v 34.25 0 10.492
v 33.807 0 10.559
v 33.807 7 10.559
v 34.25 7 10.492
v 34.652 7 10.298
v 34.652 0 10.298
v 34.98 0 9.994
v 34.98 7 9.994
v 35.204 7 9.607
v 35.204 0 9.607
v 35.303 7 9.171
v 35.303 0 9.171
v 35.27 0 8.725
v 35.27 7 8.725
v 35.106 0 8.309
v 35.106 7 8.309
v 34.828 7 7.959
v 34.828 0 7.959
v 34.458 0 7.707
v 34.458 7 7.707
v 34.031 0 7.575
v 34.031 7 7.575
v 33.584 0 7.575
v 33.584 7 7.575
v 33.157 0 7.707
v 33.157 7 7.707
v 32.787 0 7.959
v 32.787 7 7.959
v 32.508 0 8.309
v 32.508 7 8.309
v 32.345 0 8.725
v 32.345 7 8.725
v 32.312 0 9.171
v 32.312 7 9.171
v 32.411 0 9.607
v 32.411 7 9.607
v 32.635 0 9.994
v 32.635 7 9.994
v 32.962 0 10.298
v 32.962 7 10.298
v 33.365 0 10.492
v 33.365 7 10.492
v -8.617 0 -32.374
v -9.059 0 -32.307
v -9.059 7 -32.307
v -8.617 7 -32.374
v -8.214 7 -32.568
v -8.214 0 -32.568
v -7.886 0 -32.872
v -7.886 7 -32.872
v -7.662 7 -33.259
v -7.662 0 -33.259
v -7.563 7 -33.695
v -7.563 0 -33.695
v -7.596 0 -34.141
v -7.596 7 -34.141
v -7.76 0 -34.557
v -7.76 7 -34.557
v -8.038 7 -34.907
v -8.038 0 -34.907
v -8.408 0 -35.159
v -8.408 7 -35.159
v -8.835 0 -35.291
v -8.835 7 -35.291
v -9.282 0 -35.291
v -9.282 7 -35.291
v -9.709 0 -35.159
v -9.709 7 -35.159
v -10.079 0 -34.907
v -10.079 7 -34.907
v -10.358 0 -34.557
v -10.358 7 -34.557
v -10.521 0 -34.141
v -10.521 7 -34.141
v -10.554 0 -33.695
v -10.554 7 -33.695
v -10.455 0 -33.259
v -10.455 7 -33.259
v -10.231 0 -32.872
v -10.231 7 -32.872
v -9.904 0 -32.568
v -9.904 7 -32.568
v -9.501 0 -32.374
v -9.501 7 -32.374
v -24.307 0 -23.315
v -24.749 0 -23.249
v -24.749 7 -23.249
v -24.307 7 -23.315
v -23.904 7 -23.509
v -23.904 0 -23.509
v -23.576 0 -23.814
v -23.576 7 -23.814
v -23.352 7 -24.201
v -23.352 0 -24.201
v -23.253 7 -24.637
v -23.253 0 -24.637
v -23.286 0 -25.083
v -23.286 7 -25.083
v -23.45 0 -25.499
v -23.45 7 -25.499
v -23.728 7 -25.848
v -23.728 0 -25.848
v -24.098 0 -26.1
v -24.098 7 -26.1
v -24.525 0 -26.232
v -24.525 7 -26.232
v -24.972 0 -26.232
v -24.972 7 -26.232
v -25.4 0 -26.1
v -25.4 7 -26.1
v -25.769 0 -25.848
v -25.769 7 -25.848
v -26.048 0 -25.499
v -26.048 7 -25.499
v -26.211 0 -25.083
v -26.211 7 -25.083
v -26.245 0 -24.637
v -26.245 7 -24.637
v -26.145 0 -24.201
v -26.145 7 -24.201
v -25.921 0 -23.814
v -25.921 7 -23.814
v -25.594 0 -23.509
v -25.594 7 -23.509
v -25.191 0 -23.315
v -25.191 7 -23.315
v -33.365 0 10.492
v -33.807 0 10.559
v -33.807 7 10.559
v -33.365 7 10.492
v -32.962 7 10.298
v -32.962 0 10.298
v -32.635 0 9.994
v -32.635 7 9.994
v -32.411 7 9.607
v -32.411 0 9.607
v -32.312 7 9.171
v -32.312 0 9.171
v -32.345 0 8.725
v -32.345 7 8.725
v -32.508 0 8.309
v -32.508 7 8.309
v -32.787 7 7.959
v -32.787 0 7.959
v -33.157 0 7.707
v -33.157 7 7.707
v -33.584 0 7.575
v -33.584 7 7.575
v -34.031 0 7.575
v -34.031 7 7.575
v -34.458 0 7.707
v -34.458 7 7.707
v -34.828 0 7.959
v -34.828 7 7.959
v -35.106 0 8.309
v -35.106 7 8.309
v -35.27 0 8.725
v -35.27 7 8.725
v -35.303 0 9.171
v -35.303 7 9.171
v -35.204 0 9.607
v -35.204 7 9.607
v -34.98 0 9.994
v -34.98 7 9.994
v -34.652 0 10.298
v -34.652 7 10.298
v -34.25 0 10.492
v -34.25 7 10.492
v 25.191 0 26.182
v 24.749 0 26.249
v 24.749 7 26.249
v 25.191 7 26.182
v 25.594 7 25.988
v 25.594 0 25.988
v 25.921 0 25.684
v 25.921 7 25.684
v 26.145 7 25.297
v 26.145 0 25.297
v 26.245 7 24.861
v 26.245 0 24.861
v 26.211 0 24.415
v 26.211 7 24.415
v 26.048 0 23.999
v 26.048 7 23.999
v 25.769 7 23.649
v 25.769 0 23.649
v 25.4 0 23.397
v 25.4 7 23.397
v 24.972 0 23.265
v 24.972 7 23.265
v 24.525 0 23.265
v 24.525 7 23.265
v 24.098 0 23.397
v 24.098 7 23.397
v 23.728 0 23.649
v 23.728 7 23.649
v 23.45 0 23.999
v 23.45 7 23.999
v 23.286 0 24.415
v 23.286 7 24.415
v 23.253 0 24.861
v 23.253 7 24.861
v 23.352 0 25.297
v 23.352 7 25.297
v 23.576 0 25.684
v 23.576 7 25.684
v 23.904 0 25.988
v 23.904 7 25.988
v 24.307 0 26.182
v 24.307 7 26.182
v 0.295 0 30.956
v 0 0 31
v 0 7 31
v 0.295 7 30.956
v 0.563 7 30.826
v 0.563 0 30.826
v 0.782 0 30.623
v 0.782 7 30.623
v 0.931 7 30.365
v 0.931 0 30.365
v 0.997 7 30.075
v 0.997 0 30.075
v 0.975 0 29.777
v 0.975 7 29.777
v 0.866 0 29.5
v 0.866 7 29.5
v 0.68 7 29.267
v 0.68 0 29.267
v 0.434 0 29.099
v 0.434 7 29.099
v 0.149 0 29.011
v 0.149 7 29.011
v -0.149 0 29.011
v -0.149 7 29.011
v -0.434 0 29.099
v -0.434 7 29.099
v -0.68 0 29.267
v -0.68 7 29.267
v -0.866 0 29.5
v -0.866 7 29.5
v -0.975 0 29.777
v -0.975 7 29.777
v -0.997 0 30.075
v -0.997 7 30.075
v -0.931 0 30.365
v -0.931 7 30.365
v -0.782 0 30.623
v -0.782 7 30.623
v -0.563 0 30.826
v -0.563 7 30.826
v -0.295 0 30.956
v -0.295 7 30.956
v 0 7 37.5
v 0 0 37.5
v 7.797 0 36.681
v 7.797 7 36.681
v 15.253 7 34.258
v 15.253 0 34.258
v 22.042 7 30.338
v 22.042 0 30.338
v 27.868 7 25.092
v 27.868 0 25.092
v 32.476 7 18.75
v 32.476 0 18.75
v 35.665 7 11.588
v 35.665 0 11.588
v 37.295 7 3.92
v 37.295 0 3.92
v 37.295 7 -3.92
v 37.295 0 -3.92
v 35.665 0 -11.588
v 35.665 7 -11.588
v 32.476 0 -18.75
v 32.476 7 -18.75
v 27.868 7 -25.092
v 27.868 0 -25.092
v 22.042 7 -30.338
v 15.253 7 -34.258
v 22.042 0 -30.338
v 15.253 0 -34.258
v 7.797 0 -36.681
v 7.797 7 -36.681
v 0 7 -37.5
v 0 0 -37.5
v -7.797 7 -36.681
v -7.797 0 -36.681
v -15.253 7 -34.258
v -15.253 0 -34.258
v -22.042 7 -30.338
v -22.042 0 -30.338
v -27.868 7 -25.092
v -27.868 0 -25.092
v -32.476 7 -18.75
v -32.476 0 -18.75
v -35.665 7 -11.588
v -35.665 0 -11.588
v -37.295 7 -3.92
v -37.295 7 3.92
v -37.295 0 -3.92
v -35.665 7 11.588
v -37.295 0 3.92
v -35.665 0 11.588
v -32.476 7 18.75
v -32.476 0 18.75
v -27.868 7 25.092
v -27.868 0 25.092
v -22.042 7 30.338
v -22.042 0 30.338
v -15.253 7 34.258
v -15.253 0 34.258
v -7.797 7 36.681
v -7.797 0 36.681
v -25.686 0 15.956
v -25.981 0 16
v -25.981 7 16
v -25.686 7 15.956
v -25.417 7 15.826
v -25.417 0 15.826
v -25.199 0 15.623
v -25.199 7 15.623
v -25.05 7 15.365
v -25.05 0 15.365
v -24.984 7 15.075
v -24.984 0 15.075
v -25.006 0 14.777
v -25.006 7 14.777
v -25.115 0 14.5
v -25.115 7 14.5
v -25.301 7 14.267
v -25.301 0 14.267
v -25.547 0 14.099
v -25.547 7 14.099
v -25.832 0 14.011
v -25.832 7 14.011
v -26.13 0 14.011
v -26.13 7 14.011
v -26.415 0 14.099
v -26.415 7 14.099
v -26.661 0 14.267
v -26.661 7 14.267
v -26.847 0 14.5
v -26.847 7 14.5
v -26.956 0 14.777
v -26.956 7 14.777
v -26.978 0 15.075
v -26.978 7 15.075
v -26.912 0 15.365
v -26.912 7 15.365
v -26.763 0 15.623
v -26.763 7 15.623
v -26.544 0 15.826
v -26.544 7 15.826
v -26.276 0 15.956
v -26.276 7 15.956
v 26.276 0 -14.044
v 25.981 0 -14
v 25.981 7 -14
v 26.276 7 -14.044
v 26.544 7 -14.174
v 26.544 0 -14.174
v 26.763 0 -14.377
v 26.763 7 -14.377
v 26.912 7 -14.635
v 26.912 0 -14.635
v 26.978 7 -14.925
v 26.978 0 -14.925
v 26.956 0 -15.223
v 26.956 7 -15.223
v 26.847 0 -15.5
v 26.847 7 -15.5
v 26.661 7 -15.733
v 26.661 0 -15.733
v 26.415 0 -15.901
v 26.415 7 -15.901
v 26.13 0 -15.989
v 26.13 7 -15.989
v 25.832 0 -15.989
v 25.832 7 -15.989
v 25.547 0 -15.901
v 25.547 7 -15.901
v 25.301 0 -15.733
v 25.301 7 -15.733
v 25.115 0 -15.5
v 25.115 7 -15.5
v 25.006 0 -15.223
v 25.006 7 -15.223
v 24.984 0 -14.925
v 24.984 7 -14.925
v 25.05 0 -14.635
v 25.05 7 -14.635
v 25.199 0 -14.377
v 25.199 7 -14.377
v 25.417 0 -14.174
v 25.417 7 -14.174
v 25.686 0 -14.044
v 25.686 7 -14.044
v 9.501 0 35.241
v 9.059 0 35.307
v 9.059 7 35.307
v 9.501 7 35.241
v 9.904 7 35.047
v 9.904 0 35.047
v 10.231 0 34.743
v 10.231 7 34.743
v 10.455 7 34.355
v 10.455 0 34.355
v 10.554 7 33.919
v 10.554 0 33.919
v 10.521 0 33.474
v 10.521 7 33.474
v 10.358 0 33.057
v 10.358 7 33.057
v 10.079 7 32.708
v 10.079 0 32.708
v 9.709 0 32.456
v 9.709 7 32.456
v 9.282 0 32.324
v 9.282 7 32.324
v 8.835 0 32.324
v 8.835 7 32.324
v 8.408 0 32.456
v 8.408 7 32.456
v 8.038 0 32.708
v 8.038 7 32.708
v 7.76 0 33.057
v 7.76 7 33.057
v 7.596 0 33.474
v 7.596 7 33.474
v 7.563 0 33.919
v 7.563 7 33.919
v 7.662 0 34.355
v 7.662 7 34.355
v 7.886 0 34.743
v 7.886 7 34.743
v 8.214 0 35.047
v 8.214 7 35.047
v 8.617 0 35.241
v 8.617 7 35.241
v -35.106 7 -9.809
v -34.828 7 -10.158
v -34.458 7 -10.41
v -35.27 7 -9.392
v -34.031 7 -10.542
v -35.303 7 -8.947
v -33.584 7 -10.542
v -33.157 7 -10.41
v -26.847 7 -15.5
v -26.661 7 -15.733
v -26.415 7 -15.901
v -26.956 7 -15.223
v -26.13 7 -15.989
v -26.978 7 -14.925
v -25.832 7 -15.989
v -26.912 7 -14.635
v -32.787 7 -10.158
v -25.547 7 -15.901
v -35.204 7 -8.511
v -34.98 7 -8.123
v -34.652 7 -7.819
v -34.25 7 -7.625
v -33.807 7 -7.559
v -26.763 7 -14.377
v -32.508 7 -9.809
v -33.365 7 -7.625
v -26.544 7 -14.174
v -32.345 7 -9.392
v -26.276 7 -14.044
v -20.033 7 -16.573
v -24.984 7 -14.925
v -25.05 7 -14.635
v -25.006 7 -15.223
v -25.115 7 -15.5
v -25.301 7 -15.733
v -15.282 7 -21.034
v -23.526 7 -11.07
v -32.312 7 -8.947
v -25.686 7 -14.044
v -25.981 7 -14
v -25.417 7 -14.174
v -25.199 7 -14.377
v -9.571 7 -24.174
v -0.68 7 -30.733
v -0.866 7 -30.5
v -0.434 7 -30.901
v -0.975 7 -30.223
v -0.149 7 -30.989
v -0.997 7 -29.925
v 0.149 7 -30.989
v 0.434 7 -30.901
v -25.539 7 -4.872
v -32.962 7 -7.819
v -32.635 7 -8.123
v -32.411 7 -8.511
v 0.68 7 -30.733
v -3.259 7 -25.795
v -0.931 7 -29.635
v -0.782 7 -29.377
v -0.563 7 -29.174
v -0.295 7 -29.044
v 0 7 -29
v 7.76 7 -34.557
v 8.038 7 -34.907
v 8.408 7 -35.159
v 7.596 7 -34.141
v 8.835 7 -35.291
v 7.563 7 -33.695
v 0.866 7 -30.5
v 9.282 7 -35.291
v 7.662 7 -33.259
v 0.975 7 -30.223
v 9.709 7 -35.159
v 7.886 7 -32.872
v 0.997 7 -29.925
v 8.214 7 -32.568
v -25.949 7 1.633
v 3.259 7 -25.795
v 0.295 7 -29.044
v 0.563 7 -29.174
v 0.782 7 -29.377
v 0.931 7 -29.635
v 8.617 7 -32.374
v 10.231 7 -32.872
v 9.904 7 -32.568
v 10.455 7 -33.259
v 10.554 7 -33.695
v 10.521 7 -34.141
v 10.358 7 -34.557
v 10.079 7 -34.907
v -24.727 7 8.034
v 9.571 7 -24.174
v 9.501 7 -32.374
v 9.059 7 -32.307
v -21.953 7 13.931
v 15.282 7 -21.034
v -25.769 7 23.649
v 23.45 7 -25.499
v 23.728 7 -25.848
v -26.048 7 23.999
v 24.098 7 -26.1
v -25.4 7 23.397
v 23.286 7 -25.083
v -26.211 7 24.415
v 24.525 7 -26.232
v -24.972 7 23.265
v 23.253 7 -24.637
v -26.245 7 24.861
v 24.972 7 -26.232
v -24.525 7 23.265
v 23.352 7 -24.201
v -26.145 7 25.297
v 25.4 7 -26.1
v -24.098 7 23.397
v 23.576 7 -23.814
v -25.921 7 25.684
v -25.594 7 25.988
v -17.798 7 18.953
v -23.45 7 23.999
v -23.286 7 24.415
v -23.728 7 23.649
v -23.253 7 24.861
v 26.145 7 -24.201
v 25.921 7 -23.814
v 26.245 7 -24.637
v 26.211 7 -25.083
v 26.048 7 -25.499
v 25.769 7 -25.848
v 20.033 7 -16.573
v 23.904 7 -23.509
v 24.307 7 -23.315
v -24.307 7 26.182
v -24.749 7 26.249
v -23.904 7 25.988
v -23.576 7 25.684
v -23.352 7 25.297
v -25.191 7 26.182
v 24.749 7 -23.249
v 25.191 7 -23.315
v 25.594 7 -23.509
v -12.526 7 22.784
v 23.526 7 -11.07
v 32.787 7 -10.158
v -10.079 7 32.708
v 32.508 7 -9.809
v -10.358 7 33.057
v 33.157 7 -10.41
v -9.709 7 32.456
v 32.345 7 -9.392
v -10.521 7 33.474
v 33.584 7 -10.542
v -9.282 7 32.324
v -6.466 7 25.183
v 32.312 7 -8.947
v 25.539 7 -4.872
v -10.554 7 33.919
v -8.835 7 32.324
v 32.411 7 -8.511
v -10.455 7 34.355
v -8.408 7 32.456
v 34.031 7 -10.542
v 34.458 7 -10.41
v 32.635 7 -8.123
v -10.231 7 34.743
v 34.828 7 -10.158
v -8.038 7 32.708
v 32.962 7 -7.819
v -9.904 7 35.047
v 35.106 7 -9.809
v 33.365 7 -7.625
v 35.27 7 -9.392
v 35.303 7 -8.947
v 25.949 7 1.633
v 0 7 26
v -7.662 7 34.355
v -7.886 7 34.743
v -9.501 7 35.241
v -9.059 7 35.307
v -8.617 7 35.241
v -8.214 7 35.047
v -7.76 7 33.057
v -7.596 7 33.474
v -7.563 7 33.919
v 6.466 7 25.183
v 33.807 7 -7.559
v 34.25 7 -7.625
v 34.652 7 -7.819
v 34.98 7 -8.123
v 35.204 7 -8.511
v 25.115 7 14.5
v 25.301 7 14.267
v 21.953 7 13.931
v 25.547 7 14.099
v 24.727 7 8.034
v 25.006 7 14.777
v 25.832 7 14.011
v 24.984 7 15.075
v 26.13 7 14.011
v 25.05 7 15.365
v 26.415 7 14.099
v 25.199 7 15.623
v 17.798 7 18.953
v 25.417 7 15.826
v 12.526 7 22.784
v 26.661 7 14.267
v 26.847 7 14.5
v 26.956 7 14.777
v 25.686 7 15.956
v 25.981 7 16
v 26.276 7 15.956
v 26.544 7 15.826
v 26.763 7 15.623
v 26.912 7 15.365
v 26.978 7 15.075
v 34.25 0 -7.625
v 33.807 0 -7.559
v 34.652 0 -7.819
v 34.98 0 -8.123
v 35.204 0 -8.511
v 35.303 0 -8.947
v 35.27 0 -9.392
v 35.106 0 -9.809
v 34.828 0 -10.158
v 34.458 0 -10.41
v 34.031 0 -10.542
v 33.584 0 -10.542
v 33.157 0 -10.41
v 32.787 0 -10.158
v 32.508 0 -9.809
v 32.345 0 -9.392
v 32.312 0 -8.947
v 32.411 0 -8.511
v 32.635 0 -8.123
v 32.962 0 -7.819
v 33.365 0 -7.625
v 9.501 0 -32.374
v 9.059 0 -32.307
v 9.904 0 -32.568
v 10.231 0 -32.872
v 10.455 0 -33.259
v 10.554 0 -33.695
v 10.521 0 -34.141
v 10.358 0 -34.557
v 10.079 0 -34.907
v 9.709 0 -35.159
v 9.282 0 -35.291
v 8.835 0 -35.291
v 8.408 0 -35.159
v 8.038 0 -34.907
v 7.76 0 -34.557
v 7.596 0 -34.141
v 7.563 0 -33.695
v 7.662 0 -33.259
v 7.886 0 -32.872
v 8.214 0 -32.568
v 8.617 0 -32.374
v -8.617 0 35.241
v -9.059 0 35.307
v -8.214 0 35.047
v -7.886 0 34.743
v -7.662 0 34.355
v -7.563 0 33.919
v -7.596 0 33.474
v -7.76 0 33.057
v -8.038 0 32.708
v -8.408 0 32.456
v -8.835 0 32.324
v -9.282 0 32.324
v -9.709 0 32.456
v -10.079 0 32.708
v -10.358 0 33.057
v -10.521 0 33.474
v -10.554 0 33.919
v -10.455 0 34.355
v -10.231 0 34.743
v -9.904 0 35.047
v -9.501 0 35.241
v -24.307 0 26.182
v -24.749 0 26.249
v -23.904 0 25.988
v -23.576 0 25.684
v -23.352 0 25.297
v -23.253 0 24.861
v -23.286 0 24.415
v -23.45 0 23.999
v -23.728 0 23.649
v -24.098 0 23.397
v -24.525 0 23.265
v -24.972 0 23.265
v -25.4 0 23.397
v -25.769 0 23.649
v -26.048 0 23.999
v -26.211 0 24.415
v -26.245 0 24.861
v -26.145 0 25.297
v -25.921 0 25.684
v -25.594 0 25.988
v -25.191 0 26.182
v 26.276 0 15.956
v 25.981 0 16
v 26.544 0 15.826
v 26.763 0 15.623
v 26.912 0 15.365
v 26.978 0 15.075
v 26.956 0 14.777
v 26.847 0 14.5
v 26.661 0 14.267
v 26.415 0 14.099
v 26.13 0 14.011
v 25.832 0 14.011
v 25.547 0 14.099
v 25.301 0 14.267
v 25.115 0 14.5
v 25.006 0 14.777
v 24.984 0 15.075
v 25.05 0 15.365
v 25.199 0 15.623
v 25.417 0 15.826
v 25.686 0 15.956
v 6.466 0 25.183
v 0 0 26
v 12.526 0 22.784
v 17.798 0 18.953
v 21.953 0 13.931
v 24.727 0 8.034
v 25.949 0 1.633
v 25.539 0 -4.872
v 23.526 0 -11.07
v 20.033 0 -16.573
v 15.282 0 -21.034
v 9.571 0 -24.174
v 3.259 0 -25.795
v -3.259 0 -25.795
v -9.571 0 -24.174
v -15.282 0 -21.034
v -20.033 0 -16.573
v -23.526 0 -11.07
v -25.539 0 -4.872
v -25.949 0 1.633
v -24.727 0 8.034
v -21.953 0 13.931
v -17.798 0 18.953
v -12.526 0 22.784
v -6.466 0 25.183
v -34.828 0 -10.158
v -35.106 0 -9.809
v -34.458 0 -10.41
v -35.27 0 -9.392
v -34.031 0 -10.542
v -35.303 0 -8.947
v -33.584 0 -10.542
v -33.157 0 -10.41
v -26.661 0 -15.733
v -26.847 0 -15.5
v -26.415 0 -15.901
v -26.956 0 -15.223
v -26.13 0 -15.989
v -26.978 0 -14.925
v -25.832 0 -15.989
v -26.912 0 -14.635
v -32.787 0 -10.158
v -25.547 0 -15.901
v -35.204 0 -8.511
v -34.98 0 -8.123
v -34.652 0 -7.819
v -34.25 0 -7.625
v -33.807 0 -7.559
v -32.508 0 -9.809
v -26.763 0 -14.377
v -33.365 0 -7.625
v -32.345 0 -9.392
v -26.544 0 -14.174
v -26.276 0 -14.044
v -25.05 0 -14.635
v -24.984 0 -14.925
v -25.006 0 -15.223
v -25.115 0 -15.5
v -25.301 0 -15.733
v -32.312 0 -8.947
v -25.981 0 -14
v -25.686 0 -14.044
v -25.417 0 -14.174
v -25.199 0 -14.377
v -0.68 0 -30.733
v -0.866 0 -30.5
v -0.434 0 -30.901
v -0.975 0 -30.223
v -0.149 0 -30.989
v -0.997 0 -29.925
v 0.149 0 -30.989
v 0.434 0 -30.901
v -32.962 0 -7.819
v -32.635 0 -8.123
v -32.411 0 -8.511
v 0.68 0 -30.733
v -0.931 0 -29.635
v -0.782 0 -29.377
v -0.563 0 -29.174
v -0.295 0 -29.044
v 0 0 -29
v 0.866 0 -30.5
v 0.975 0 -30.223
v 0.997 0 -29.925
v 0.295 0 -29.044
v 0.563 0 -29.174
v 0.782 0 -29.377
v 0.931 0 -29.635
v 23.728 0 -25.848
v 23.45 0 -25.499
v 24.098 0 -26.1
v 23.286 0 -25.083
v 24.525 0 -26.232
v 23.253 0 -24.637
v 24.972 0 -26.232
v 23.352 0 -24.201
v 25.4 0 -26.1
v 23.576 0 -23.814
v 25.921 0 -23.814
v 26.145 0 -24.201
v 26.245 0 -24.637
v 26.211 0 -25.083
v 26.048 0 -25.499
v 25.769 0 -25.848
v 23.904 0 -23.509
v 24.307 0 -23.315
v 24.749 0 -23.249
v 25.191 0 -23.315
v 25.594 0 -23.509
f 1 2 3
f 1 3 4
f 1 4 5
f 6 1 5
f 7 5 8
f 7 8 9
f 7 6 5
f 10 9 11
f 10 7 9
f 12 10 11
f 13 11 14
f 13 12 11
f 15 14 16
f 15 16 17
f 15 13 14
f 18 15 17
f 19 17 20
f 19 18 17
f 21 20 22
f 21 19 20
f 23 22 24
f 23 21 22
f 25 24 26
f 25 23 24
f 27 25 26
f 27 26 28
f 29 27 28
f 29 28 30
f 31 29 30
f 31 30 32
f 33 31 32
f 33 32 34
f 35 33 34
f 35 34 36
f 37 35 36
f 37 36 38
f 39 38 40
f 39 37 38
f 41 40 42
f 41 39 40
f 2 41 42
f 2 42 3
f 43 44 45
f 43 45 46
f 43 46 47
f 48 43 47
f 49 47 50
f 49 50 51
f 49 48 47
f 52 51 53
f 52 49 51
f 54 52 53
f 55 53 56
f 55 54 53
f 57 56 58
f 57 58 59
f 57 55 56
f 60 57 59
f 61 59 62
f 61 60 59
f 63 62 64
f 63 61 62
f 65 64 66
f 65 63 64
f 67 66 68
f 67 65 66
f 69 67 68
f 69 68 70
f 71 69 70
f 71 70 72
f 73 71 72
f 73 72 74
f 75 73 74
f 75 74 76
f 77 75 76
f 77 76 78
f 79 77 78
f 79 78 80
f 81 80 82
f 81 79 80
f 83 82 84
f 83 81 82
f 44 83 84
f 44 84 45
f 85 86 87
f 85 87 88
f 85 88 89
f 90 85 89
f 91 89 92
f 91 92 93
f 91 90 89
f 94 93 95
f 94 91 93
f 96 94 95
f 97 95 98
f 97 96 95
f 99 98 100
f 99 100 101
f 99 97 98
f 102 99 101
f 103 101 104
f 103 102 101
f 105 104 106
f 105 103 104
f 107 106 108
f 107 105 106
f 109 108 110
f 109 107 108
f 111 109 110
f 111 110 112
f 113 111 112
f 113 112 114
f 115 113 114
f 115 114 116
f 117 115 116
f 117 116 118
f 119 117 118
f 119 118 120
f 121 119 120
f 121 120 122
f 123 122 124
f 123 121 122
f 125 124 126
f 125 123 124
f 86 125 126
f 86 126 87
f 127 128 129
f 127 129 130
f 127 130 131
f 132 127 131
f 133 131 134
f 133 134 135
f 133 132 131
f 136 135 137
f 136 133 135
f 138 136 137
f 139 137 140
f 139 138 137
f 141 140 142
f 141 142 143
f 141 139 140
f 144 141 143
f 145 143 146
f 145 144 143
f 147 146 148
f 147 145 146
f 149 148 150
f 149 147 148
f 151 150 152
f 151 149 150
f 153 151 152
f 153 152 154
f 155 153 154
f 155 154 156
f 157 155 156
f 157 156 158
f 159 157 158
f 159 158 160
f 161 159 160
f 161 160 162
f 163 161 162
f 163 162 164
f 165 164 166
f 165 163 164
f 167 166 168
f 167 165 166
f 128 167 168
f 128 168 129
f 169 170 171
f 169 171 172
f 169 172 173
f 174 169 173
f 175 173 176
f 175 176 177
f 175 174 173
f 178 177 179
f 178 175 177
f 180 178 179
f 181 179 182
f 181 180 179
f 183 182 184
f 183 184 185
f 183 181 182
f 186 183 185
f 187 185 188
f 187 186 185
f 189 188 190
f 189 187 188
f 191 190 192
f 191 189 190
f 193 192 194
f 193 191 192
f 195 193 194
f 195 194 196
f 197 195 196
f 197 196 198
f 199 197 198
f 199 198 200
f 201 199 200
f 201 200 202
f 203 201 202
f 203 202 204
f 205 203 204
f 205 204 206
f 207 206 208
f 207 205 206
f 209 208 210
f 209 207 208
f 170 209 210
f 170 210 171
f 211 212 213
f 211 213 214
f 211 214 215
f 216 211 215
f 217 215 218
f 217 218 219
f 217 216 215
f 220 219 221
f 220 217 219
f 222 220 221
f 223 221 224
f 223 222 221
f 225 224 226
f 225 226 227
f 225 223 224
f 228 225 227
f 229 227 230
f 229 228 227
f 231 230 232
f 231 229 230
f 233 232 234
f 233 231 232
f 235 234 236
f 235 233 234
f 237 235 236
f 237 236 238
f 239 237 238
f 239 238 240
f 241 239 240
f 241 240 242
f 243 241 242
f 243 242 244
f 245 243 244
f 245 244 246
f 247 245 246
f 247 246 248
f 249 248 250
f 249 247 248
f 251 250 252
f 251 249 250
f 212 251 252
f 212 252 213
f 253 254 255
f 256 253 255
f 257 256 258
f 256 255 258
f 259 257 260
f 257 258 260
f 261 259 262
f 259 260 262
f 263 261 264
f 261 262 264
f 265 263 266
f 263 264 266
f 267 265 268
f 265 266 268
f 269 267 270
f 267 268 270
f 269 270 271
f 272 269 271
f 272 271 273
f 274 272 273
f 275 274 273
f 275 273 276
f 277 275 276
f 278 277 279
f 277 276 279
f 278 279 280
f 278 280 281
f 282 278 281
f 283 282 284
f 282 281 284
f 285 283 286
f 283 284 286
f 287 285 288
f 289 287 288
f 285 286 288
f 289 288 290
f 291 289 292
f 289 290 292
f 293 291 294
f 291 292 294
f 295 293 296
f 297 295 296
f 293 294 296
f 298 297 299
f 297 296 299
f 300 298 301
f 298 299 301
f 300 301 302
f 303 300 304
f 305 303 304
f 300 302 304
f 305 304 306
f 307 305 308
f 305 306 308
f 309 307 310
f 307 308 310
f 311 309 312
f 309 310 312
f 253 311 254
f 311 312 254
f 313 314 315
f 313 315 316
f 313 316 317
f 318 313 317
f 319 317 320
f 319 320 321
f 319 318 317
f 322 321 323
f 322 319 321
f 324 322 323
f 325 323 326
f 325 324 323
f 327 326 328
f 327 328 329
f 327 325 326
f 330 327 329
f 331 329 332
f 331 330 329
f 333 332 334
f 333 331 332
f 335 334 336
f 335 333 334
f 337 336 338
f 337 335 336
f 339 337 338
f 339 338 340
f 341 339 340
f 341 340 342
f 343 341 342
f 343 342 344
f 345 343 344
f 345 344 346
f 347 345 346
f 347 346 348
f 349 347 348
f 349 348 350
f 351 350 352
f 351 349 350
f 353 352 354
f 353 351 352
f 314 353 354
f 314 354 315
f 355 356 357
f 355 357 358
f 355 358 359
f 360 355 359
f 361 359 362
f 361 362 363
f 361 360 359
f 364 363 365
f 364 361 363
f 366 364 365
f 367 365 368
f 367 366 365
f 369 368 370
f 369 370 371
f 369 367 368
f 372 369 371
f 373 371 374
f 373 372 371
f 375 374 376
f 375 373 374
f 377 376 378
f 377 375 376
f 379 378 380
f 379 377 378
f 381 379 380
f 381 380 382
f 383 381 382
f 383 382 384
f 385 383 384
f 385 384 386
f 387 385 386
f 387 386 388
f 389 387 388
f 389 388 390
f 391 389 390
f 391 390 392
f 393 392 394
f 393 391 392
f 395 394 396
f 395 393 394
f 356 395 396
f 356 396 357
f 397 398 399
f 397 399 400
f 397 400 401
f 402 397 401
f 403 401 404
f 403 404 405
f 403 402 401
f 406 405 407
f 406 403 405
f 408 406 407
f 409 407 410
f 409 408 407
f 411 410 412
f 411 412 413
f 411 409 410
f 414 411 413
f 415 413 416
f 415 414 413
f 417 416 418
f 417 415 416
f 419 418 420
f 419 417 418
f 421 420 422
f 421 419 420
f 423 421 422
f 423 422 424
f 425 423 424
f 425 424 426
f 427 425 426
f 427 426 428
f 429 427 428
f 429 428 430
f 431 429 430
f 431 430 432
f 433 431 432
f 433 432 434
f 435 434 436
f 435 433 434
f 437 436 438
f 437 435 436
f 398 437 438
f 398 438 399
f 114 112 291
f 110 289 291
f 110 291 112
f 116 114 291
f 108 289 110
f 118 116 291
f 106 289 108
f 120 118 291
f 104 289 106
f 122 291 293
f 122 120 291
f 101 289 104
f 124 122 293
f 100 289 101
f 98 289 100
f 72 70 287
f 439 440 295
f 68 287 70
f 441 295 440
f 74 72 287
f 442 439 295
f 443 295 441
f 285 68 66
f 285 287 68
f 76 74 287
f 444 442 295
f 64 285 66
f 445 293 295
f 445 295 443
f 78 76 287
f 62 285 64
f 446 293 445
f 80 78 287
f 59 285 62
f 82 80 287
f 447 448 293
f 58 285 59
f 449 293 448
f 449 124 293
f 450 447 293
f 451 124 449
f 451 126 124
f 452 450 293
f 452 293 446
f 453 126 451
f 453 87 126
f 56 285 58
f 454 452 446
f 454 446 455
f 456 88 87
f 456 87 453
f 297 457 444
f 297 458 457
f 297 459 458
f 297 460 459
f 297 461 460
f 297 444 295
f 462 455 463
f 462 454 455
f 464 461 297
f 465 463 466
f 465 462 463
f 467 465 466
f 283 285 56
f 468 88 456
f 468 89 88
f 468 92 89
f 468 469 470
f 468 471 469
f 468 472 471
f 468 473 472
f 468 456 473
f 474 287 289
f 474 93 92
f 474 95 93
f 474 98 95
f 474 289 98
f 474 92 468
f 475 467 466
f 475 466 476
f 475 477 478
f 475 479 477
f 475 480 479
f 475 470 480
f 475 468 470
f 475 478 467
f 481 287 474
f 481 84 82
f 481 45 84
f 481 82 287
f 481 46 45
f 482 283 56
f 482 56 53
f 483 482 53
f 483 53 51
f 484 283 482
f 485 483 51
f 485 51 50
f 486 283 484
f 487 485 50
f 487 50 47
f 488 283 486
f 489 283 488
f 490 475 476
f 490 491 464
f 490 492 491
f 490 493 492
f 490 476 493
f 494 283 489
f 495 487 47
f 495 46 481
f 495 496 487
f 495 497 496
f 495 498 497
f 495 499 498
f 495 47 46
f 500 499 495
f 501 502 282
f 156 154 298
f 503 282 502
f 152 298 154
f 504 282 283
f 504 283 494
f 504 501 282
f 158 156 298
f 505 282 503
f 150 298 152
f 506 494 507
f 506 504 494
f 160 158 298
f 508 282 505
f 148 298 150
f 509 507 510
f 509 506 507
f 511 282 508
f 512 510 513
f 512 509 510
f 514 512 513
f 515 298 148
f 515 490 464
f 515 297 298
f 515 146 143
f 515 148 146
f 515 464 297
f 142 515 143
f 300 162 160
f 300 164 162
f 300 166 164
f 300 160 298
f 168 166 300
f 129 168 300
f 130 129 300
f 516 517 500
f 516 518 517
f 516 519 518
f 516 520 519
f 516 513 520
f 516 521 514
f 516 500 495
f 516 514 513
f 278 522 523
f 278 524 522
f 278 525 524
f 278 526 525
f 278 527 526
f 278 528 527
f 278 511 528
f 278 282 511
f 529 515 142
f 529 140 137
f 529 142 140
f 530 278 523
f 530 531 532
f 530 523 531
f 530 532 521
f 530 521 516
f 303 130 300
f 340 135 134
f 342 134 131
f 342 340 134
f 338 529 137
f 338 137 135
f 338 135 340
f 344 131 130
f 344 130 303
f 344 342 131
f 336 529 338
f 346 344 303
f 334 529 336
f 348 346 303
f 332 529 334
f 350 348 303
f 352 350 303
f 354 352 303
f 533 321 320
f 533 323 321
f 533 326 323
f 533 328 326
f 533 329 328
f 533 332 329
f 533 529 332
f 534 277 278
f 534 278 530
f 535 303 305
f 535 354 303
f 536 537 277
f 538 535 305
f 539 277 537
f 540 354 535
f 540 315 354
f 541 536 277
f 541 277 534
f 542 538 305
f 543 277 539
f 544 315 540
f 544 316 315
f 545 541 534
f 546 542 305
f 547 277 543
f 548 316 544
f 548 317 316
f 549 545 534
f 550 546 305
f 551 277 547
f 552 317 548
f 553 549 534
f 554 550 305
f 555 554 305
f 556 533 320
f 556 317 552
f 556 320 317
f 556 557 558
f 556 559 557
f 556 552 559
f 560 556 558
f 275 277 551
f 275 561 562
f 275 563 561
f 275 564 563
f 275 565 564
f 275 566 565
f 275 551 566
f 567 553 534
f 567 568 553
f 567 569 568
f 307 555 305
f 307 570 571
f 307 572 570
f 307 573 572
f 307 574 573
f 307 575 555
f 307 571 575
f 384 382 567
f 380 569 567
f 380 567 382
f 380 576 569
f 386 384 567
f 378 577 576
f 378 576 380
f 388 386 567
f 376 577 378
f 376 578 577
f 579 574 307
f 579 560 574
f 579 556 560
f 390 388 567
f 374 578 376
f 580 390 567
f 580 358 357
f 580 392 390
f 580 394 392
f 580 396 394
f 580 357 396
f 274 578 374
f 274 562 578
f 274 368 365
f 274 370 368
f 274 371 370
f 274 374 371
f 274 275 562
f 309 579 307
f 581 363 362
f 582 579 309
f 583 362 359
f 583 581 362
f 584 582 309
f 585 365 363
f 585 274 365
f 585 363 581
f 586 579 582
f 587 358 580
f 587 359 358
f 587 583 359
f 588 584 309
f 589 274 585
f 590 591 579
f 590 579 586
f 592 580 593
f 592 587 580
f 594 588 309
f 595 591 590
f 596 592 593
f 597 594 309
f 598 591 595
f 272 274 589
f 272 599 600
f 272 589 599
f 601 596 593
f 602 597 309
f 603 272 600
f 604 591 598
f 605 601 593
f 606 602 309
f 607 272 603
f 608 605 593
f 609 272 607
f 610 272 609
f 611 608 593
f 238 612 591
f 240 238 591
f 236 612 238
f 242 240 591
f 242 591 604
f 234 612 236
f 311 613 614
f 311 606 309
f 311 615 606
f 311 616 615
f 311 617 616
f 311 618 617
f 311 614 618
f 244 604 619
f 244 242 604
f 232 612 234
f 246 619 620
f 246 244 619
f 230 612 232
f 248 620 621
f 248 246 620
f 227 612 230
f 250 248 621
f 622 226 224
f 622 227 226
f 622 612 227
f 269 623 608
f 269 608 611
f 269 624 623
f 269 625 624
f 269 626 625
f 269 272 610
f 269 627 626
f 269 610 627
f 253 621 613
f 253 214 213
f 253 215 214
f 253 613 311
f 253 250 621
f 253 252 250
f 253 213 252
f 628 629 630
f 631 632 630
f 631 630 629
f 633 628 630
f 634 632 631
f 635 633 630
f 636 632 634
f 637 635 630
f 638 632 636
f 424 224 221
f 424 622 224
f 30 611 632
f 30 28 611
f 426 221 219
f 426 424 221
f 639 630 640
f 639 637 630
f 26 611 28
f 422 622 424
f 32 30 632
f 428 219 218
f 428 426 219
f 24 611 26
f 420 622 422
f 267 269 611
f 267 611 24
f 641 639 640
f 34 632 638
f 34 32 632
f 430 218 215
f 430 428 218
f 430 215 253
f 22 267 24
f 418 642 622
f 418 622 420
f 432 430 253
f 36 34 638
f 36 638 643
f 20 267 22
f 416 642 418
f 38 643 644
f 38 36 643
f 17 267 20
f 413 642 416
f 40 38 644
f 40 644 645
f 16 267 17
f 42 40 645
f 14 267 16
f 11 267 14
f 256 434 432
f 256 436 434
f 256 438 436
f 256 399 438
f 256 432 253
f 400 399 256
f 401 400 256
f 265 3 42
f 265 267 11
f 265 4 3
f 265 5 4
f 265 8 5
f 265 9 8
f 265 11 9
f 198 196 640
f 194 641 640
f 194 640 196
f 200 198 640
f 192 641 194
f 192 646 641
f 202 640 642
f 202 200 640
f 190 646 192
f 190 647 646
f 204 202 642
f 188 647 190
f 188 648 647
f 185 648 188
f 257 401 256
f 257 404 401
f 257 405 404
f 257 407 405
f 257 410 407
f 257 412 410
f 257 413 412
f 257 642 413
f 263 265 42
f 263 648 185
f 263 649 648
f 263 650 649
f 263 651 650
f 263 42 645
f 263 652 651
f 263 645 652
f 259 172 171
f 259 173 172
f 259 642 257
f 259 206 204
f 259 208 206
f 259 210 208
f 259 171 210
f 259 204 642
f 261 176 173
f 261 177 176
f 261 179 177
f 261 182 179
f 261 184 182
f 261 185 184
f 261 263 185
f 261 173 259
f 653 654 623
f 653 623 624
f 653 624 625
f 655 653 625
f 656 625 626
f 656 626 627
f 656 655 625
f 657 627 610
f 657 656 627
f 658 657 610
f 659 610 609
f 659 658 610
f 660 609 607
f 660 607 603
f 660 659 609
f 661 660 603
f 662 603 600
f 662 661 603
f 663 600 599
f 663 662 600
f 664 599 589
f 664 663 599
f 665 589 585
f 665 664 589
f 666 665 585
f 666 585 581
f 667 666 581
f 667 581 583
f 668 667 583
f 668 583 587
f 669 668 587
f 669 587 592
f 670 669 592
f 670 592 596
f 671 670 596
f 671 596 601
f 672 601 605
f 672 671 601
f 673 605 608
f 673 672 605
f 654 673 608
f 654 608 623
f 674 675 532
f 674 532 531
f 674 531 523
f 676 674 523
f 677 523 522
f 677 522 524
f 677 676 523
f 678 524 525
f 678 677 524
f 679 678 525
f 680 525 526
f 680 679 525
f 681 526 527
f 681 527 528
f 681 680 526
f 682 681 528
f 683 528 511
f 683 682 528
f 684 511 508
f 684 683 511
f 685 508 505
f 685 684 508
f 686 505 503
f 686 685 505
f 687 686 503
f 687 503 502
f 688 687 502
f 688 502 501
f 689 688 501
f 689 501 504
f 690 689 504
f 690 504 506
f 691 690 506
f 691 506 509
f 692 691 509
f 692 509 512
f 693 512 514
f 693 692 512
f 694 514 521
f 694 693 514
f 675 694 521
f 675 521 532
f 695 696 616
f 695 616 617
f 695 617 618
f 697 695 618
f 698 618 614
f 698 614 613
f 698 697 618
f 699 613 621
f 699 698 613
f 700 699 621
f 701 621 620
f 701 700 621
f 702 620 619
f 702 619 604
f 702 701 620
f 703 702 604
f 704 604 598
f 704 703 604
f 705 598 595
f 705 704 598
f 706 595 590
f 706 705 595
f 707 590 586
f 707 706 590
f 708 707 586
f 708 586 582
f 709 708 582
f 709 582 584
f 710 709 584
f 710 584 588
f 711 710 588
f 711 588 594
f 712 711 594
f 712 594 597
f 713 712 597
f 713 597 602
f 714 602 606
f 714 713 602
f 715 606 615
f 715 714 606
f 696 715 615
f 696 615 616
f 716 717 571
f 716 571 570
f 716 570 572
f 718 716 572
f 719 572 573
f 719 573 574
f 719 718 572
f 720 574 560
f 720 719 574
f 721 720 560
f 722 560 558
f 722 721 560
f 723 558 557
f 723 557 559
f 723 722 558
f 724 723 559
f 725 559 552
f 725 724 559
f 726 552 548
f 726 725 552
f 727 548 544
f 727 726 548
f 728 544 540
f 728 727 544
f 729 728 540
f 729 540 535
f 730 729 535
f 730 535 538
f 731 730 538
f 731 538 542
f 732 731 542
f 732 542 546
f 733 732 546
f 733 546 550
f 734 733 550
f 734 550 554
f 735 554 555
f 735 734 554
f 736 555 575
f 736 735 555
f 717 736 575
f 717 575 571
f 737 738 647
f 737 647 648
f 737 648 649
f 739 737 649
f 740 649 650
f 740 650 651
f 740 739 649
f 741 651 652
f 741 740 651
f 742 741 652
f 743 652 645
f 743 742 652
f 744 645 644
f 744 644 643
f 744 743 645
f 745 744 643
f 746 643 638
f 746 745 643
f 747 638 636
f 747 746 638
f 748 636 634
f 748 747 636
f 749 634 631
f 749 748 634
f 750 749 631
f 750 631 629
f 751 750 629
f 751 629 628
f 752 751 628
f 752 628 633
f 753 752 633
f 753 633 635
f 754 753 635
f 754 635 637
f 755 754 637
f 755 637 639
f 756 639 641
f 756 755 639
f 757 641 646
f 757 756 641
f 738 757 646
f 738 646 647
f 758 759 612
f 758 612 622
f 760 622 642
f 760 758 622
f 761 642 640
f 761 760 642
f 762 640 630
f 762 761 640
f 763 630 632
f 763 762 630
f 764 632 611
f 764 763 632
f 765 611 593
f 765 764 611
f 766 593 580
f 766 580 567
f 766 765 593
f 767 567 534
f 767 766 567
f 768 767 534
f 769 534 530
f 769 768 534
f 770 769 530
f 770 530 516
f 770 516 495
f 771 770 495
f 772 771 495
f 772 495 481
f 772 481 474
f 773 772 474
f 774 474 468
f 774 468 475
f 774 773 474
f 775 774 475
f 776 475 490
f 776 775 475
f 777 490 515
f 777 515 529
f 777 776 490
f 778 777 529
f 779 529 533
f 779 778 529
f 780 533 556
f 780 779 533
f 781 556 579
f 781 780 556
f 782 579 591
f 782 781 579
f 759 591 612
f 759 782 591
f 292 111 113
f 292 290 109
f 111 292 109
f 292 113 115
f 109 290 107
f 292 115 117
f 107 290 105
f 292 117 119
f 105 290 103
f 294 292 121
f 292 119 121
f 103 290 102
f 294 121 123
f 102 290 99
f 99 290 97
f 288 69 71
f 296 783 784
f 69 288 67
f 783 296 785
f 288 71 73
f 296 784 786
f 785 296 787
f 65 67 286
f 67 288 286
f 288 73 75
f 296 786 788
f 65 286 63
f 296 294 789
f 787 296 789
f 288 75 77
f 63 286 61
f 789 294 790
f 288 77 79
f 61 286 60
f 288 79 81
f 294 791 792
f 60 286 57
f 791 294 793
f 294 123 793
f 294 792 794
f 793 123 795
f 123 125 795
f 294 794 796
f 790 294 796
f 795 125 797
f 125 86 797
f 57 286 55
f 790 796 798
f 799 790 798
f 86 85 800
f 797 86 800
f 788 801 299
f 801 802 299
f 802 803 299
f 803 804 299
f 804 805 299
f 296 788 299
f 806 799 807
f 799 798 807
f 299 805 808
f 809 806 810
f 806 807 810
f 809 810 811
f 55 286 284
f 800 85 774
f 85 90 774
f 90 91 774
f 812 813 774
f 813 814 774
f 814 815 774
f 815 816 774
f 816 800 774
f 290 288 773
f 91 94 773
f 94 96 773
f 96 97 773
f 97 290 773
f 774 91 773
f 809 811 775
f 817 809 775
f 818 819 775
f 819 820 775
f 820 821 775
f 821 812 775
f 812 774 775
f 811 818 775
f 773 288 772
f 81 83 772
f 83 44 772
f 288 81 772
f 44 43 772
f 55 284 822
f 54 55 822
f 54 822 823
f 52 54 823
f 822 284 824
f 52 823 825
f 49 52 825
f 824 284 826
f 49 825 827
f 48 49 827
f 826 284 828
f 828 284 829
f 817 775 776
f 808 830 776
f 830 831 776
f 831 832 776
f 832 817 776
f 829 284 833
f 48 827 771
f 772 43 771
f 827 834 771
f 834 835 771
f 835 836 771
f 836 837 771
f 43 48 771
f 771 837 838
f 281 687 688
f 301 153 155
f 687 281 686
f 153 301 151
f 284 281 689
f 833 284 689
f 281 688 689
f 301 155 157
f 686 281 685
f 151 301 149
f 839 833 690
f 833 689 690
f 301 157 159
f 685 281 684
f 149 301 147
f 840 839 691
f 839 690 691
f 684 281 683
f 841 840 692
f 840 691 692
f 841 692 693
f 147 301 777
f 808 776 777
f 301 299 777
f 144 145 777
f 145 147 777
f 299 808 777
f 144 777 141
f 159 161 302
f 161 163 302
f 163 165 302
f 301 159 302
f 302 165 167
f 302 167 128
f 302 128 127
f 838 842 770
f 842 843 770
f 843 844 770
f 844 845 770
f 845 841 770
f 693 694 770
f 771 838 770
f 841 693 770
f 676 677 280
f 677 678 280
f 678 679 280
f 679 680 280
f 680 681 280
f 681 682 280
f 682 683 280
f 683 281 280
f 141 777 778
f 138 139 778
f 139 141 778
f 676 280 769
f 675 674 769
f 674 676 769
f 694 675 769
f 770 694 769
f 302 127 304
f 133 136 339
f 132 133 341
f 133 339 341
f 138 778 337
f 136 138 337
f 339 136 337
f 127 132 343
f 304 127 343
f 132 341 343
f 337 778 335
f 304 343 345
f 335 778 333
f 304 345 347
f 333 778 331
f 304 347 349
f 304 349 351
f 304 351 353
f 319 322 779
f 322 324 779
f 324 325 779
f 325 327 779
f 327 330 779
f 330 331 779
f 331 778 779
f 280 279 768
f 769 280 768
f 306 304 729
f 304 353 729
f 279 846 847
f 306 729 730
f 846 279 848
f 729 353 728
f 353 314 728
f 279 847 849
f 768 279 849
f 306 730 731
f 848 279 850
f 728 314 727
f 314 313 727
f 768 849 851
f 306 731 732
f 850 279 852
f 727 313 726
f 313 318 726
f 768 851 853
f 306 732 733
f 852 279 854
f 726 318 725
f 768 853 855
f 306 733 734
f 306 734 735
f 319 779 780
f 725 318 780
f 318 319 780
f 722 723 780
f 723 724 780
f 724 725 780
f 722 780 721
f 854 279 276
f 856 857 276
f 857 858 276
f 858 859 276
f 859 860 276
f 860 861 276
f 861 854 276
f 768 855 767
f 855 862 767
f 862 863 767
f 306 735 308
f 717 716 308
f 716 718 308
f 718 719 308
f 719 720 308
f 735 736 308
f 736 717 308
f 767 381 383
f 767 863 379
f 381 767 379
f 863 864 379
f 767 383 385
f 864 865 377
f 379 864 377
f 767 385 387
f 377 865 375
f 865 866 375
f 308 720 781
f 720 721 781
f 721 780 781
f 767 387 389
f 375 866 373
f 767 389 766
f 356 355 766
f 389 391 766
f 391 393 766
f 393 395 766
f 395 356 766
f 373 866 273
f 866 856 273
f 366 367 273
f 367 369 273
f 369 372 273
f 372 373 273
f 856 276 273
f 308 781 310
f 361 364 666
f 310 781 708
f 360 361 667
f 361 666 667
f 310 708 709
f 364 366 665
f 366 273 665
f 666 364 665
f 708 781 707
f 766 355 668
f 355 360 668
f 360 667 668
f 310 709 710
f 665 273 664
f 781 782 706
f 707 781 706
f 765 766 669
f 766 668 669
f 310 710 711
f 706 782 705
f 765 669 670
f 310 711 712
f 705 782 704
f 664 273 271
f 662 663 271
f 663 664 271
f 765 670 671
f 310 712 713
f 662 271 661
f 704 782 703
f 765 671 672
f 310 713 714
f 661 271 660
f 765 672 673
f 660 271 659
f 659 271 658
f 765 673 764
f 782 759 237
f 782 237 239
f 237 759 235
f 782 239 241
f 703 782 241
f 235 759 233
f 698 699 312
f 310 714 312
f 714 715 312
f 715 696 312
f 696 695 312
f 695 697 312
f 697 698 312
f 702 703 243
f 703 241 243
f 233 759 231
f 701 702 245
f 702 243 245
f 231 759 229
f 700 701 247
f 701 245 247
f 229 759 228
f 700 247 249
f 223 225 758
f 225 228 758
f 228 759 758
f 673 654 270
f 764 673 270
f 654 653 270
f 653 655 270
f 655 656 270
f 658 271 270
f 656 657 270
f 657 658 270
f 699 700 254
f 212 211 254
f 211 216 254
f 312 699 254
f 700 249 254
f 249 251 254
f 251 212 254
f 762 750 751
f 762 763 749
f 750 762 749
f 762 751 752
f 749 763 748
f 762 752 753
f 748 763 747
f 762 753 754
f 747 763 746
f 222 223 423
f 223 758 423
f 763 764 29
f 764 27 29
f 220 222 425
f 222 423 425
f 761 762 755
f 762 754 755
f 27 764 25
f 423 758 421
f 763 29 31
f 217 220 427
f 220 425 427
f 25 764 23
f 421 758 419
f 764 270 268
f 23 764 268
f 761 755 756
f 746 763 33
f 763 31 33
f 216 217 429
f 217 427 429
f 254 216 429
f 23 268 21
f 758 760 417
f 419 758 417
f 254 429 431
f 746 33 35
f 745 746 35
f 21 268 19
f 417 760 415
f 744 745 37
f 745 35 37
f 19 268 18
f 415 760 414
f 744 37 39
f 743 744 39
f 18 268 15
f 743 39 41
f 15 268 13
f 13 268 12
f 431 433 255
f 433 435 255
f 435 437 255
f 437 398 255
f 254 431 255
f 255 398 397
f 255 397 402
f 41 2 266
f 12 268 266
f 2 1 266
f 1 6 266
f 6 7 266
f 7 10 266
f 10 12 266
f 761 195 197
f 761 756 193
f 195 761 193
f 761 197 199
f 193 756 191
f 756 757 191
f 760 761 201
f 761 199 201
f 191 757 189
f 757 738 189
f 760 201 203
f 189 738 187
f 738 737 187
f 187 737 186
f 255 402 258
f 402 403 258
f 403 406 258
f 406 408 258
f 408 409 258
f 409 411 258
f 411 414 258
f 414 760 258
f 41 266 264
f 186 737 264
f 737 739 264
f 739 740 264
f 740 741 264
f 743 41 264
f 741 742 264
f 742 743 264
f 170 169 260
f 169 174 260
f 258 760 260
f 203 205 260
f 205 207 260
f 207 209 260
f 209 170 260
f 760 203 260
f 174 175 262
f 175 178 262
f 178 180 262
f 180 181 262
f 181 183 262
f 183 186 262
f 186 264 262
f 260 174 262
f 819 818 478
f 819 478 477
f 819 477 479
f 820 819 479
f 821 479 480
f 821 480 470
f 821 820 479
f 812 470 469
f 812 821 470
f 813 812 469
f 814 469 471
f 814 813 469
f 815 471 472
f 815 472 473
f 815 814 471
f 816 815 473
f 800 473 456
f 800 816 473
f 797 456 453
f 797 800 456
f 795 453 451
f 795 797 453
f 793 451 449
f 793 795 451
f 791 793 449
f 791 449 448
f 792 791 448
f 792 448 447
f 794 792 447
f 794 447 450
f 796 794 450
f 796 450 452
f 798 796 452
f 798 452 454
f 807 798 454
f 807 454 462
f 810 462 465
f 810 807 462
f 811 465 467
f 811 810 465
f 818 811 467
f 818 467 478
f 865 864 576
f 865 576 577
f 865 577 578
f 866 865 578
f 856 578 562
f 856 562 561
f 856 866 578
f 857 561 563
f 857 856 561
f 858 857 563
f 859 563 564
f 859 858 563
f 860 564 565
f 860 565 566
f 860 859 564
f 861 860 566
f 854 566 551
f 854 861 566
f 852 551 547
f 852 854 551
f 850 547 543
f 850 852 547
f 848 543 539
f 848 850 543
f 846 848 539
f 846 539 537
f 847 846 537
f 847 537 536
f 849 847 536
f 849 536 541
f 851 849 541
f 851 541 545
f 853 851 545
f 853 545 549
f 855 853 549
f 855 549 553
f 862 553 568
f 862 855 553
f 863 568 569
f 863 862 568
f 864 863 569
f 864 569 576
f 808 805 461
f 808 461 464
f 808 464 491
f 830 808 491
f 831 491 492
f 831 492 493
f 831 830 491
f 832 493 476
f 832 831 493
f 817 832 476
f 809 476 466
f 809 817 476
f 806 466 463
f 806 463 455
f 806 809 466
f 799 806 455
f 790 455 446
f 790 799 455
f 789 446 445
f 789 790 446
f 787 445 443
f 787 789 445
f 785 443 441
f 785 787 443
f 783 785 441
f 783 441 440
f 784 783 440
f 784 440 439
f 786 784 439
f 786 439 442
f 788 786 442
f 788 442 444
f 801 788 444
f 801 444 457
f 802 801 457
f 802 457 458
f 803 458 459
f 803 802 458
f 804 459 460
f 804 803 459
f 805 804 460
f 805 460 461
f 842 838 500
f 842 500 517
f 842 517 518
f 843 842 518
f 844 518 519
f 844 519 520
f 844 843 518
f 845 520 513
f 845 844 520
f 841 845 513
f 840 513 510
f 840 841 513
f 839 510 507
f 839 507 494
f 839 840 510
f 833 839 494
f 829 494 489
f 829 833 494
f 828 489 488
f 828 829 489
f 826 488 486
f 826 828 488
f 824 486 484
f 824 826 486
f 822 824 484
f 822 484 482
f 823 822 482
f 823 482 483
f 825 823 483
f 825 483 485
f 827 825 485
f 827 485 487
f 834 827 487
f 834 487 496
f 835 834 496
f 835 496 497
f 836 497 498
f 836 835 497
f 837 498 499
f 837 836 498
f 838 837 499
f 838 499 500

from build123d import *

# Parameters (mm, degrees)
SKETCH1_R           = 37.5
SKETCH1_R_2         = 26
SKETCH1_R_3         = 1
SKETCH1_R_4         = 1.5
BOSS_EXTRUDE1_DEPTH = 7


with BuildPart() as part:
    # Sketch1 → Boss-Extrude1 (new body)
    with BuildSketch(Plane(origin=(0, 0, 0), x_dir=(1, 0, 0), z_dir=(0, 1, 0))):
        with Locations(Location((0, 0, 0), (0, 0, 270))):
            Circle(SKETCH1_R)
        with Locations(Location((0, 0, 0), (0, 0, 270))):
            Circle(SKETCH1_R_2, mode=Mode.SUBTRACT)
        with Locations(Location((0, 30, 0), (0, 0, 270))):
            Circle(SKETCH1_R_3, mode=Mode.SUBTRACT)
        with Locations(Location((25.980762114, 15, 0), (0, 0, 270))):
            Circle(SKETCH1_R_3, mode=Mode.SUBTRACT)
        with Locations(Location((25.980762114, -15, 0), (0, 0, 270))):
            Circle(SKETCH1_R_3, mode=Mode.SUBTRACT)
        with Locations(Location((0, -30, 0), (0, 0, 270))):
            Circle(SKETCH1_R_3, mode=Mode.SUBTRACT)
        with Locations(Location((-25.980762114, -15, 0), (0, 0, 270))):
            Circle(SKETCH1_R_3, mode=Mode.SUBTRACT)
        with Locations(Location((-25.980762114, 15, 0), (0, 0, 270))):
            Circle(SKETCH1_R_3, mode=Mode.SUBTRACT)
        with Locations(Location((-33.80740392, -9.058666579, 0), (0, 0, 270))):
            Circle(SKETCH1_R_4, mode=Mode.SUBTRACT)
        with Locations(Location((-33.80740392, 9.058666579, 0), (0, 0, 270))):
            Circle(SKETCH1_R_4, mode=Mode.SUBTRACT)
        with Locations(Location((-24.748737342, 24.748737342, 0), (0, 0, 270))):
            Circle(SKETCH1_R_4, mode=Mode.SUBTRACT)
        with Locations(Location((-9.058666579, 33.80740392, 0), (0, 0, 270))):
            Circle(SKETCH1_R_4, mode=Mode.SUBTRACT)
        with Locations(Location((9.058666579, 33.80740392, 0), (0, 0, 270))):
            Circle(SKETCH1_R_4, mode=Mode.SUBTRACT)
        with Locations(Location((24.748737342, 24.748737342, 0), (0, 0, 270))):
            Circle(SKETCH1_R_4, mode=Mode.SUBTRACT)
        with Locations(Location((33.80740392, 9.058666579, 0), (0, 0, 270))):
            Circle(SKETCH1_R_4, mode=Mode.SUBTRACT)
        with Locations(Location((33.80740392, -9.058666579, 0), (0, 0, 270))):
            Circle(SKETCH1_R_4, mode=Mode.SUBTRACT)
        with Locations(Location((24.748737342, -24.748737342, 0), (0, 0, 270))):
            Circle(SKETCH1_R_4, mode=Mode.SUBTRACT)
        with Locations(Location((9.058666579, -33.80740392, 0), (0, 0, 270))):
            Circle(SKETCH1_R_4, mode=Mode.SUBTRACT)
        with Locations(Location((-9.058666579, -33.80740392, 0), (0, 0, 270))):
            Circle(SKETCH1_R_4, mode=Mode.SUBTRACT)
        with Locations(Location((-24.748737342, -24.748737342, 0), (0, 0, 270))):
            Circle(SKETCH1_R_4, mode=Mode.SUBTRACT)
    extrude(amount=BOSS_EXTRUDE1_DEPTH)


solid = part.part
